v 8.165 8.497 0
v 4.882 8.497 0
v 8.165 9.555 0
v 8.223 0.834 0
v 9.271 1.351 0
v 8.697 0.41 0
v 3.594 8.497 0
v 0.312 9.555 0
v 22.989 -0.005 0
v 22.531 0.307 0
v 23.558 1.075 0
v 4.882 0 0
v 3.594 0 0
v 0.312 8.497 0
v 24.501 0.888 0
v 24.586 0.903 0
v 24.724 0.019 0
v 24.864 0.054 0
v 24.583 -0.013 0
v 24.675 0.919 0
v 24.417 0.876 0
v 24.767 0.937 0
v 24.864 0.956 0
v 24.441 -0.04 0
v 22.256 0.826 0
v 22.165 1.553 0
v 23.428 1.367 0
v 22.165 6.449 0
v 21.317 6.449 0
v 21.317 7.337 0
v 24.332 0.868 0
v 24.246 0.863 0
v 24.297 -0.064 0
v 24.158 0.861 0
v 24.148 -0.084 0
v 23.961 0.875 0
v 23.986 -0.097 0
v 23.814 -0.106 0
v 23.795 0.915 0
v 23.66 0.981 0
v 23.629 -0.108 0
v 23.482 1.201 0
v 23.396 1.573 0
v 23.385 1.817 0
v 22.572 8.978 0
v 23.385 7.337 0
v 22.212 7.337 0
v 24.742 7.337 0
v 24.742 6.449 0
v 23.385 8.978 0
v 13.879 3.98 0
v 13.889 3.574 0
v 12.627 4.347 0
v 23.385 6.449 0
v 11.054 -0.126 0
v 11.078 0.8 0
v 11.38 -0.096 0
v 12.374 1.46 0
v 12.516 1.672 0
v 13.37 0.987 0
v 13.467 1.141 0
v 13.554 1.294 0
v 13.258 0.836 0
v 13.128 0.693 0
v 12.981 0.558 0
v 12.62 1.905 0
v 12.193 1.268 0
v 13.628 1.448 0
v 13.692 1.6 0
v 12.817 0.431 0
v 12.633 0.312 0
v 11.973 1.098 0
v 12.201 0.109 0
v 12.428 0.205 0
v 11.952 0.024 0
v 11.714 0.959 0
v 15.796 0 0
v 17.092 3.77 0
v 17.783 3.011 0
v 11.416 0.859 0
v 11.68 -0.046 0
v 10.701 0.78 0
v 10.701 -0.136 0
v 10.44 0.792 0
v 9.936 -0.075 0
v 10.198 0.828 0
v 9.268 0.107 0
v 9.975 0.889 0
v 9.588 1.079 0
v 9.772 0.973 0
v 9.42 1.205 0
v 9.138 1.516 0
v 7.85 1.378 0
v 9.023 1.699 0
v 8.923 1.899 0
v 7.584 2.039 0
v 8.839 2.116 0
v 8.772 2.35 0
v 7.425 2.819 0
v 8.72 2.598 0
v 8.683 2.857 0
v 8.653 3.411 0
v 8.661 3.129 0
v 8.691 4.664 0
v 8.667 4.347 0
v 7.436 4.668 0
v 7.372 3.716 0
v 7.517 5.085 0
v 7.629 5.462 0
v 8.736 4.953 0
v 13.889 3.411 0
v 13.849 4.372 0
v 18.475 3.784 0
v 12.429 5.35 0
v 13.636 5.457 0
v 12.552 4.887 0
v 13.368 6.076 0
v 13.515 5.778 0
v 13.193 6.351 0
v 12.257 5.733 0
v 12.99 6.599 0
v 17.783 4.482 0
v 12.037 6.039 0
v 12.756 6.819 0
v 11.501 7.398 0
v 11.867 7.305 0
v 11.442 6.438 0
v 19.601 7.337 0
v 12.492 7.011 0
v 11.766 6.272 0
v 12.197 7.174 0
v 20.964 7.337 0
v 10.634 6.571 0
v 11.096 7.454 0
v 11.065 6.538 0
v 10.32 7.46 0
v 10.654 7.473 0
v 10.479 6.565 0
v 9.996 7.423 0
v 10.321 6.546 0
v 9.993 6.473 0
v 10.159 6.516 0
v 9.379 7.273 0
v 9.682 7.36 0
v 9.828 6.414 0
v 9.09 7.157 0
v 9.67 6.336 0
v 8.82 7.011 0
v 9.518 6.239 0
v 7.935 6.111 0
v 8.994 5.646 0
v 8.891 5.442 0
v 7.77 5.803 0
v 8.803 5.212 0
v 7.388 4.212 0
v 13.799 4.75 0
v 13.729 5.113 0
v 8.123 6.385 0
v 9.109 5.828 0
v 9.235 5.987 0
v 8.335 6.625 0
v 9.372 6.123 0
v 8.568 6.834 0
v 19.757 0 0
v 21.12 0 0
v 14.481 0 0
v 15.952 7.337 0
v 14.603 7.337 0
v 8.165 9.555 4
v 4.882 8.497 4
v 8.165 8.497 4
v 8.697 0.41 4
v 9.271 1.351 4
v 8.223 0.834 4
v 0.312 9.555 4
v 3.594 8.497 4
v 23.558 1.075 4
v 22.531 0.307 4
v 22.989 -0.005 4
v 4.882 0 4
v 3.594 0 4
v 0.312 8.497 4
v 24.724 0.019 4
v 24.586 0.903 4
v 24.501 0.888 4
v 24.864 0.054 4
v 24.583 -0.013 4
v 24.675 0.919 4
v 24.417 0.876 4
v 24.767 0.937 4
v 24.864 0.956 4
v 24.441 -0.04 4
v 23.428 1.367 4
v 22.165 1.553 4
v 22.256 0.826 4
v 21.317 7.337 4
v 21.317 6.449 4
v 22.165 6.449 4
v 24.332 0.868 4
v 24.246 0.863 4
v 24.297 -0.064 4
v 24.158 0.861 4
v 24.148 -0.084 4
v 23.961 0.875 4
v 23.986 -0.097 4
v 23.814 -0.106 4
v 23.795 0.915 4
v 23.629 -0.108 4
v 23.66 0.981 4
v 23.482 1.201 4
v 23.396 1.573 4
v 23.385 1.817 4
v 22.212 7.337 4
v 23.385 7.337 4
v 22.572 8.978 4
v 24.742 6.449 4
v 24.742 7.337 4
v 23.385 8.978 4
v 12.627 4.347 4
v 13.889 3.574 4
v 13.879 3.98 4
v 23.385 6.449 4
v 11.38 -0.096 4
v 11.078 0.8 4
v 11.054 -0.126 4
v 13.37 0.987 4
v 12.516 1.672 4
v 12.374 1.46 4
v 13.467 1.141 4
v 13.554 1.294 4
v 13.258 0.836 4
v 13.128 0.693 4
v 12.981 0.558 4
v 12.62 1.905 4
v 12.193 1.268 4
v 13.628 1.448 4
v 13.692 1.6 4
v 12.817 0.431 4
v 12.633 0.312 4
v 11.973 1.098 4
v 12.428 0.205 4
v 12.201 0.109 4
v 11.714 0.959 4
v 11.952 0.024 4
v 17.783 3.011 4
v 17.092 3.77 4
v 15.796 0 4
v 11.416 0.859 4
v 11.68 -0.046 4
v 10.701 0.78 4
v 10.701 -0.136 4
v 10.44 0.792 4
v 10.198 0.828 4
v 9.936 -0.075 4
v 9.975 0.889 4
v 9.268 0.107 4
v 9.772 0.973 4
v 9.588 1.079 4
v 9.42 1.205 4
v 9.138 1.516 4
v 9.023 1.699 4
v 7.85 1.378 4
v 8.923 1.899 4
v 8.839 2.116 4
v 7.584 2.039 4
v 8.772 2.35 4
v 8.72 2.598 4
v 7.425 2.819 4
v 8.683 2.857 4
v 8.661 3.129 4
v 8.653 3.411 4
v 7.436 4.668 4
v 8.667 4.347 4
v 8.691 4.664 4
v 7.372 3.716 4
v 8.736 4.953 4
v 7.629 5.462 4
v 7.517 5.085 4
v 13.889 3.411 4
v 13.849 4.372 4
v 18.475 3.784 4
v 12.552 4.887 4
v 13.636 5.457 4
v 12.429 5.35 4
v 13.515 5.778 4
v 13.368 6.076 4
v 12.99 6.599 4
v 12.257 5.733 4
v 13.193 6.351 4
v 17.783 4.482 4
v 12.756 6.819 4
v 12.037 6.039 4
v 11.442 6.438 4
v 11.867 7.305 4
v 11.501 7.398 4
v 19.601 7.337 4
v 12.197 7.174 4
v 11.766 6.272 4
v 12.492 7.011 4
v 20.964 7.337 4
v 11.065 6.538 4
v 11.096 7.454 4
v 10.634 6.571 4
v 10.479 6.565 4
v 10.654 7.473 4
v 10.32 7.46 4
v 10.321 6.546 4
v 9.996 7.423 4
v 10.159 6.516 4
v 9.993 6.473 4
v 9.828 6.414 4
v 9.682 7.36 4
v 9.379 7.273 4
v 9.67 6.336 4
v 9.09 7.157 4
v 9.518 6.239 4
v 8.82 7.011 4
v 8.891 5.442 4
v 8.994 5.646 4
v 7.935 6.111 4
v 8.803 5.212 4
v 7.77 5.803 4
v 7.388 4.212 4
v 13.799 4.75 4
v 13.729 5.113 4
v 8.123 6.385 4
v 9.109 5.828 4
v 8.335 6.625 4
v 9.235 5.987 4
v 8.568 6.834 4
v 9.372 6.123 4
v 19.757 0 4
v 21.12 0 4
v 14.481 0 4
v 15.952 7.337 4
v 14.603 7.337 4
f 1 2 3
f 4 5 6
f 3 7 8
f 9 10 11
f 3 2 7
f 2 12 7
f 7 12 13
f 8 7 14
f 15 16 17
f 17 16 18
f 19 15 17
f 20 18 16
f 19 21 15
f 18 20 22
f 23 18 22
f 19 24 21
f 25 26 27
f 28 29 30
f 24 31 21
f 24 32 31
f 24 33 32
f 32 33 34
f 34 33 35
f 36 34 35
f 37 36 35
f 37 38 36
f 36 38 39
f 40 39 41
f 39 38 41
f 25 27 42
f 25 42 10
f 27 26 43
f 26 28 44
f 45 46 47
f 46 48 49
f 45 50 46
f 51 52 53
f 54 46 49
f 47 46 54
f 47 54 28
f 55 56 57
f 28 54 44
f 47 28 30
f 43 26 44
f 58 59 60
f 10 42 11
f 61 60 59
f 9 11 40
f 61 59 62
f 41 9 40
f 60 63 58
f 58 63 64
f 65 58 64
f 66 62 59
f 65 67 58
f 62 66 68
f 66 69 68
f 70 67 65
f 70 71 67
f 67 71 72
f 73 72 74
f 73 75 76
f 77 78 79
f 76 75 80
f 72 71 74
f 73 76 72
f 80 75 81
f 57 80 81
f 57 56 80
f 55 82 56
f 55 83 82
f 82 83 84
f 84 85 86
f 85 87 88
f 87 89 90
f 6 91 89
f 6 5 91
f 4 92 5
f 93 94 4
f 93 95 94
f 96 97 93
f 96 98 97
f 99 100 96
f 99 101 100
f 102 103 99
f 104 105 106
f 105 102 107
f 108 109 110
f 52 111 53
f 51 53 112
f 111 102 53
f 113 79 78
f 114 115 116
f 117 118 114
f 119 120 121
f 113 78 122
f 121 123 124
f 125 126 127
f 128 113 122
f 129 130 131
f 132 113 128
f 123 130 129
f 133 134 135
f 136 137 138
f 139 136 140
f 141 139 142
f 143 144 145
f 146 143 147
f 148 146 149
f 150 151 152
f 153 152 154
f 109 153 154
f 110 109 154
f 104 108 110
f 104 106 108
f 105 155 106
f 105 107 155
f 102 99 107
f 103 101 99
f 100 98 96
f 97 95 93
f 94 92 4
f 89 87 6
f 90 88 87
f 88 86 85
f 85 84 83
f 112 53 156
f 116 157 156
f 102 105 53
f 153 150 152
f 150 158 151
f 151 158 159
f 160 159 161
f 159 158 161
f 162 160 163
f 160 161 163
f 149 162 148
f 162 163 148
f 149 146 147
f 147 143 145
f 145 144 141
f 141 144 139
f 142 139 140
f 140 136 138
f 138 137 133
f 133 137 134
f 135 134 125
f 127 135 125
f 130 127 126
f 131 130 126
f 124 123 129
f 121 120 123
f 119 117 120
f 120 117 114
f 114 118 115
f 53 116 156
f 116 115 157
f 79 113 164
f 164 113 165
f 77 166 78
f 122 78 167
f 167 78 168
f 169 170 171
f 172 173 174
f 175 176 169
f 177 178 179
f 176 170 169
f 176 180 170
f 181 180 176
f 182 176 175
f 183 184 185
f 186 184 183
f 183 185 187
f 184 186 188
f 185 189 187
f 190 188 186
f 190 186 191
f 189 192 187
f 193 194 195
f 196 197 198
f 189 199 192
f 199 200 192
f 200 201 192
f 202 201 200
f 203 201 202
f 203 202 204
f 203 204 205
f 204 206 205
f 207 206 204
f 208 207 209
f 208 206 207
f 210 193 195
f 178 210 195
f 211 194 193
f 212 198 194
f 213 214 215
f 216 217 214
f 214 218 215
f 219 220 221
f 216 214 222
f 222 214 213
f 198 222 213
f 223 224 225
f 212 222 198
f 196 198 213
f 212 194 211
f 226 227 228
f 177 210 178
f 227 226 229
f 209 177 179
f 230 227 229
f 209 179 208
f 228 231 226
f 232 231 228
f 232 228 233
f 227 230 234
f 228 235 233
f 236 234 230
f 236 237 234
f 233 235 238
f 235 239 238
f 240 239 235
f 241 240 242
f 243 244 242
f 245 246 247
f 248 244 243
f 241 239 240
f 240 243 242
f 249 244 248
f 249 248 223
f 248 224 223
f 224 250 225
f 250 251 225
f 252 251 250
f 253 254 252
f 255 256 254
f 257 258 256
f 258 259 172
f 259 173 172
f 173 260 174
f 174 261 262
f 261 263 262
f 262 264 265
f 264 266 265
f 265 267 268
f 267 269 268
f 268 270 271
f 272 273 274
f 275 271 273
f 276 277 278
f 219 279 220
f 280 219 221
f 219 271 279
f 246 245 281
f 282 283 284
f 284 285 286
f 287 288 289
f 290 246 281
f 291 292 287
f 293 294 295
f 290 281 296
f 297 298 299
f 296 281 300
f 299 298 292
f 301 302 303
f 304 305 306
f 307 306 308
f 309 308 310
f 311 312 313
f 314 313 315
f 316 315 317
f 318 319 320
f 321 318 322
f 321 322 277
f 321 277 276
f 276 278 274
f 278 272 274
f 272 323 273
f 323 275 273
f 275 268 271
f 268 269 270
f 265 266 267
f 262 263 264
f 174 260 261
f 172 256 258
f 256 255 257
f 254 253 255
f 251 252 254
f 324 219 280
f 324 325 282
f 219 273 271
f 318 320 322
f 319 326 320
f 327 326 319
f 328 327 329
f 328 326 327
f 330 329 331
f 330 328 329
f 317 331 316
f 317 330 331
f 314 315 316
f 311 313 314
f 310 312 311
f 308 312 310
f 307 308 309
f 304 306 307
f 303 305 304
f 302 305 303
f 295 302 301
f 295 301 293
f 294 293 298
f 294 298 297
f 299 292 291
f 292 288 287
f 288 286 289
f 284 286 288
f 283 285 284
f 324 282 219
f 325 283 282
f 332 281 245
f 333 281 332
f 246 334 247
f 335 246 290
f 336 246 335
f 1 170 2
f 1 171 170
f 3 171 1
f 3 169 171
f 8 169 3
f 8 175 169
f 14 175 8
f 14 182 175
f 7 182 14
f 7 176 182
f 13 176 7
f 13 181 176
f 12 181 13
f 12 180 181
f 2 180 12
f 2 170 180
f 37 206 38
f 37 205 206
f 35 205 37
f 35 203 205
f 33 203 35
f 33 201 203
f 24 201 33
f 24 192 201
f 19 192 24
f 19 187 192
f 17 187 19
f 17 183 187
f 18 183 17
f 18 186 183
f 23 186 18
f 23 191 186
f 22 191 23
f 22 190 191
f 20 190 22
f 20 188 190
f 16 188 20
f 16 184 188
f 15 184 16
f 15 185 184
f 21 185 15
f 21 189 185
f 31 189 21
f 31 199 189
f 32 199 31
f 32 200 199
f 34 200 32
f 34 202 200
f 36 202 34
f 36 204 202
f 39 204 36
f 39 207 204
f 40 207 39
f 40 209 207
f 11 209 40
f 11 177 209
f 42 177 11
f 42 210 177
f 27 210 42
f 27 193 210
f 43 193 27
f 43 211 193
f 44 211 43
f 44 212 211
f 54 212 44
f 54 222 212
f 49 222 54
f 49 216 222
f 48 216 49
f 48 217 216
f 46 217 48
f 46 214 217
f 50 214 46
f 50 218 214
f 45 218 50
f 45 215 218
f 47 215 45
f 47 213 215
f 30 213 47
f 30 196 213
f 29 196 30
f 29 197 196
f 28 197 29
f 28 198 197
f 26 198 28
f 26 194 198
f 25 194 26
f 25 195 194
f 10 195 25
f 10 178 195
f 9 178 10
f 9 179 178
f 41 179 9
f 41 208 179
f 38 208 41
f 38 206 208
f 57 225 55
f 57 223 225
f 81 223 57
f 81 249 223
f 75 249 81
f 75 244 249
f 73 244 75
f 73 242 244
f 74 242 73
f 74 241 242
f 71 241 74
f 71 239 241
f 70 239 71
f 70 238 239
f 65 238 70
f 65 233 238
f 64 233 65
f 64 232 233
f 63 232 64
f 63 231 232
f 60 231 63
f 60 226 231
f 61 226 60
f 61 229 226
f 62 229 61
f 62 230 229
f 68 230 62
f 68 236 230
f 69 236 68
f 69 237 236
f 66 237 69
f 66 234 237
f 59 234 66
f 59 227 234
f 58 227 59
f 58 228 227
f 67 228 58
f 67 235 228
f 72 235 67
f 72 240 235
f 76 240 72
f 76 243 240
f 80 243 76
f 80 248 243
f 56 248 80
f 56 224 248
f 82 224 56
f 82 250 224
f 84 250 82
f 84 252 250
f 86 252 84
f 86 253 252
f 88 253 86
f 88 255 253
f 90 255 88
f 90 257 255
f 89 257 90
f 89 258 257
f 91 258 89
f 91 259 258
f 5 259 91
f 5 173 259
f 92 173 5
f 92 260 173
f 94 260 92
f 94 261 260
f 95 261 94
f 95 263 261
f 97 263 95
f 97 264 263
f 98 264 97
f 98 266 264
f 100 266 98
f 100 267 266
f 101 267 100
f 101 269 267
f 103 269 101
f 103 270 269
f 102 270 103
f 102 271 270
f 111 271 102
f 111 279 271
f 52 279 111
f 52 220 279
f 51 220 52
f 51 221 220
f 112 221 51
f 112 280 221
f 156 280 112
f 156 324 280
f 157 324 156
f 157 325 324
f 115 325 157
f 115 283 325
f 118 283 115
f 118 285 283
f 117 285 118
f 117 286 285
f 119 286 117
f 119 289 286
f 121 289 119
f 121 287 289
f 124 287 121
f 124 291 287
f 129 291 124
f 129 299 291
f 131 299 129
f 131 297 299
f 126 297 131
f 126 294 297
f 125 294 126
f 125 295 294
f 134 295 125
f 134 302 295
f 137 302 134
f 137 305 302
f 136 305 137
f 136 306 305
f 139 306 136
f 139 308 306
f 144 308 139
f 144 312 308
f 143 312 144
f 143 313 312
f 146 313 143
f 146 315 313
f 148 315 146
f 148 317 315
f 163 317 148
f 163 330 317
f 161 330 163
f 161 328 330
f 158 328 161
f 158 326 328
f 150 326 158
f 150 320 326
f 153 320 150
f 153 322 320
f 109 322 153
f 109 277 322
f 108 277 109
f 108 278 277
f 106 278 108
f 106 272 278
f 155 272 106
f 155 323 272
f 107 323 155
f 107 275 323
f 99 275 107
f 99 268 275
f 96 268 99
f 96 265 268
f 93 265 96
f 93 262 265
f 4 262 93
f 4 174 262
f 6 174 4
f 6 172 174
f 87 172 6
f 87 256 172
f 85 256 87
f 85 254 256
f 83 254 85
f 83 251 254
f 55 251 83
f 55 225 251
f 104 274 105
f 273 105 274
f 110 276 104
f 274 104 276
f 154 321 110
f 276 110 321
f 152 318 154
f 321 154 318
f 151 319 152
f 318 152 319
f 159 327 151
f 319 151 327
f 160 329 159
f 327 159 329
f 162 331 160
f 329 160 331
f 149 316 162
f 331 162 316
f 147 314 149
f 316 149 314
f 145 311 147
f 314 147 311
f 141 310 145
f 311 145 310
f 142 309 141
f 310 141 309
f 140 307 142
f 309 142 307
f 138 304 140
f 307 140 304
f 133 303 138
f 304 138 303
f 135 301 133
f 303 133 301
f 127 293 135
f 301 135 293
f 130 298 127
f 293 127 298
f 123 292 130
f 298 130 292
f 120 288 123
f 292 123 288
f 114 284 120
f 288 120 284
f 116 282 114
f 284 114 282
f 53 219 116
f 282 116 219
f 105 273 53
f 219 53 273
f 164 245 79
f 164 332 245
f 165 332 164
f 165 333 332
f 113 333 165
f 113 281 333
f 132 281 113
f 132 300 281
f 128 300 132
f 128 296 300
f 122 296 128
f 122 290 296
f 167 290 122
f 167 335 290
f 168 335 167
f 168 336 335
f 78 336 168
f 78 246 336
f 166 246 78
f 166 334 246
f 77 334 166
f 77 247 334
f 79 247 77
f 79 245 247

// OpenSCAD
// Parameters
inputText="Text";


//3d Text Example
linear_extrude(4) {
    text(inputText);
}
